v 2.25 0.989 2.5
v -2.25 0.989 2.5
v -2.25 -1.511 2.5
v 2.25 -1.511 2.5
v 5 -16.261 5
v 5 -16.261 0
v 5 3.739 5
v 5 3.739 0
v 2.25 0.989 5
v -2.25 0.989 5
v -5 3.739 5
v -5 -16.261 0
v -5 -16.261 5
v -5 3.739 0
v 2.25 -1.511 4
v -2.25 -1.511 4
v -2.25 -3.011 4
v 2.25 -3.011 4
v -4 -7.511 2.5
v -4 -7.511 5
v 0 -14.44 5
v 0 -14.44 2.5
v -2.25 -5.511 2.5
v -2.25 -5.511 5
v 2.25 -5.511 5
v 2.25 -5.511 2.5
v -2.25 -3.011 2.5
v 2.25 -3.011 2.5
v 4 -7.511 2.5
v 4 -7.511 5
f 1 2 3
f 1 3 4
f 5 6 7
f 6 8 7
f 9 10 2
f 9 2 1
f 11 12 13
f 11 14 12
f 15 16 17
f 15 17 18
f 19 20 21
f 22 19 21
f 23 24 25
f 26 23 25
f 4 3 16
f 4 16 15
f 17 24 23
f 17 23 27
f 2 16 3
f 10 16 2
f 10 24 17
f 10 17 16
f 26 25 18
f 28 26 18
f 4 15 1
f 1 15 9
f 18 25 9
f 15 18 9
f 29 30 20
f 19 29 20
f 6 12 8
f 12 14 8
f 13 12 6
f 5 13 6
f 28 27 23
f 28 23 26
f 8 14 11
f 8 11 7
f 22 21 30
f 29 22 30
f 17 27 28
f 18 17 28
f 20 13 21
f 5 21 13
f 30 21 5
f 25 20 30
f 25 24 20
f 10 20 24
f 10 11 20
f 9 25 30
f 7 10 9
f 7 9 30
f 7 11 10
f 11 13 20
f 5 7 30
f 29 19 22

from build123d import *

# Parameters (mm, degrees)
F0_W     = 10
F0_H     = 10
F1_DEPTH = 5
F3_DEPTH = 10
F2_W     = 4.5
F2_H     = 6.5
F4_DEPTH = 2.5
F6_DEPTH = 2.5
F7_W     = 4.5
F7_H     = 1.5
F8_DEPTH = 1.5


with BuildPart() as f1:
    # F0 (on Top) → F1 (new body)
    with BuildSketch(Plane.XY):
        with Locations((0, -1.2614674985)):
            Rectangle(F0_W, F0_H)
    extrude(amount=F1_DEPTH)

    # F3 (add): a face of the model
    f3_faces = [f1.faces().sort_by_distance(p)[0] for p in [
        (0, -6.2614674985, 2.5),
    ]]
    extrude(f3_faces, amount=F3_DEPTH)

    # F2 (on face) → F4 (cut)
    with BuildSketch(Plane.XY.offset(5)):
        with Locations((0, -2.2614674985)):
            Rectangle(F2_W, F2_H)
    extrude(amount=-F4_DEPTH, mode=Mode.SUBTRACT)

    # F5 (on face) → F6 (cut)
    with BuildSketch(Plane.XY.offset(5)):
        Polygon((-4, -7.5114674985), (0, -14.4396707288), (4, -7.5114674985), align=None)
    extrude(amount=-F6_DEPTH, mode=Mode.SUBTRACT)

    # F7 (on face) → F8 (join)
    with BuildSketch(Plane.XY.offset(2.5)):
        with Locations((0, -2.2614674985)):
            Rectangle(F7_W, F7_H)
    extrude(amount=F8_DEPTH)


solid = f1.part
